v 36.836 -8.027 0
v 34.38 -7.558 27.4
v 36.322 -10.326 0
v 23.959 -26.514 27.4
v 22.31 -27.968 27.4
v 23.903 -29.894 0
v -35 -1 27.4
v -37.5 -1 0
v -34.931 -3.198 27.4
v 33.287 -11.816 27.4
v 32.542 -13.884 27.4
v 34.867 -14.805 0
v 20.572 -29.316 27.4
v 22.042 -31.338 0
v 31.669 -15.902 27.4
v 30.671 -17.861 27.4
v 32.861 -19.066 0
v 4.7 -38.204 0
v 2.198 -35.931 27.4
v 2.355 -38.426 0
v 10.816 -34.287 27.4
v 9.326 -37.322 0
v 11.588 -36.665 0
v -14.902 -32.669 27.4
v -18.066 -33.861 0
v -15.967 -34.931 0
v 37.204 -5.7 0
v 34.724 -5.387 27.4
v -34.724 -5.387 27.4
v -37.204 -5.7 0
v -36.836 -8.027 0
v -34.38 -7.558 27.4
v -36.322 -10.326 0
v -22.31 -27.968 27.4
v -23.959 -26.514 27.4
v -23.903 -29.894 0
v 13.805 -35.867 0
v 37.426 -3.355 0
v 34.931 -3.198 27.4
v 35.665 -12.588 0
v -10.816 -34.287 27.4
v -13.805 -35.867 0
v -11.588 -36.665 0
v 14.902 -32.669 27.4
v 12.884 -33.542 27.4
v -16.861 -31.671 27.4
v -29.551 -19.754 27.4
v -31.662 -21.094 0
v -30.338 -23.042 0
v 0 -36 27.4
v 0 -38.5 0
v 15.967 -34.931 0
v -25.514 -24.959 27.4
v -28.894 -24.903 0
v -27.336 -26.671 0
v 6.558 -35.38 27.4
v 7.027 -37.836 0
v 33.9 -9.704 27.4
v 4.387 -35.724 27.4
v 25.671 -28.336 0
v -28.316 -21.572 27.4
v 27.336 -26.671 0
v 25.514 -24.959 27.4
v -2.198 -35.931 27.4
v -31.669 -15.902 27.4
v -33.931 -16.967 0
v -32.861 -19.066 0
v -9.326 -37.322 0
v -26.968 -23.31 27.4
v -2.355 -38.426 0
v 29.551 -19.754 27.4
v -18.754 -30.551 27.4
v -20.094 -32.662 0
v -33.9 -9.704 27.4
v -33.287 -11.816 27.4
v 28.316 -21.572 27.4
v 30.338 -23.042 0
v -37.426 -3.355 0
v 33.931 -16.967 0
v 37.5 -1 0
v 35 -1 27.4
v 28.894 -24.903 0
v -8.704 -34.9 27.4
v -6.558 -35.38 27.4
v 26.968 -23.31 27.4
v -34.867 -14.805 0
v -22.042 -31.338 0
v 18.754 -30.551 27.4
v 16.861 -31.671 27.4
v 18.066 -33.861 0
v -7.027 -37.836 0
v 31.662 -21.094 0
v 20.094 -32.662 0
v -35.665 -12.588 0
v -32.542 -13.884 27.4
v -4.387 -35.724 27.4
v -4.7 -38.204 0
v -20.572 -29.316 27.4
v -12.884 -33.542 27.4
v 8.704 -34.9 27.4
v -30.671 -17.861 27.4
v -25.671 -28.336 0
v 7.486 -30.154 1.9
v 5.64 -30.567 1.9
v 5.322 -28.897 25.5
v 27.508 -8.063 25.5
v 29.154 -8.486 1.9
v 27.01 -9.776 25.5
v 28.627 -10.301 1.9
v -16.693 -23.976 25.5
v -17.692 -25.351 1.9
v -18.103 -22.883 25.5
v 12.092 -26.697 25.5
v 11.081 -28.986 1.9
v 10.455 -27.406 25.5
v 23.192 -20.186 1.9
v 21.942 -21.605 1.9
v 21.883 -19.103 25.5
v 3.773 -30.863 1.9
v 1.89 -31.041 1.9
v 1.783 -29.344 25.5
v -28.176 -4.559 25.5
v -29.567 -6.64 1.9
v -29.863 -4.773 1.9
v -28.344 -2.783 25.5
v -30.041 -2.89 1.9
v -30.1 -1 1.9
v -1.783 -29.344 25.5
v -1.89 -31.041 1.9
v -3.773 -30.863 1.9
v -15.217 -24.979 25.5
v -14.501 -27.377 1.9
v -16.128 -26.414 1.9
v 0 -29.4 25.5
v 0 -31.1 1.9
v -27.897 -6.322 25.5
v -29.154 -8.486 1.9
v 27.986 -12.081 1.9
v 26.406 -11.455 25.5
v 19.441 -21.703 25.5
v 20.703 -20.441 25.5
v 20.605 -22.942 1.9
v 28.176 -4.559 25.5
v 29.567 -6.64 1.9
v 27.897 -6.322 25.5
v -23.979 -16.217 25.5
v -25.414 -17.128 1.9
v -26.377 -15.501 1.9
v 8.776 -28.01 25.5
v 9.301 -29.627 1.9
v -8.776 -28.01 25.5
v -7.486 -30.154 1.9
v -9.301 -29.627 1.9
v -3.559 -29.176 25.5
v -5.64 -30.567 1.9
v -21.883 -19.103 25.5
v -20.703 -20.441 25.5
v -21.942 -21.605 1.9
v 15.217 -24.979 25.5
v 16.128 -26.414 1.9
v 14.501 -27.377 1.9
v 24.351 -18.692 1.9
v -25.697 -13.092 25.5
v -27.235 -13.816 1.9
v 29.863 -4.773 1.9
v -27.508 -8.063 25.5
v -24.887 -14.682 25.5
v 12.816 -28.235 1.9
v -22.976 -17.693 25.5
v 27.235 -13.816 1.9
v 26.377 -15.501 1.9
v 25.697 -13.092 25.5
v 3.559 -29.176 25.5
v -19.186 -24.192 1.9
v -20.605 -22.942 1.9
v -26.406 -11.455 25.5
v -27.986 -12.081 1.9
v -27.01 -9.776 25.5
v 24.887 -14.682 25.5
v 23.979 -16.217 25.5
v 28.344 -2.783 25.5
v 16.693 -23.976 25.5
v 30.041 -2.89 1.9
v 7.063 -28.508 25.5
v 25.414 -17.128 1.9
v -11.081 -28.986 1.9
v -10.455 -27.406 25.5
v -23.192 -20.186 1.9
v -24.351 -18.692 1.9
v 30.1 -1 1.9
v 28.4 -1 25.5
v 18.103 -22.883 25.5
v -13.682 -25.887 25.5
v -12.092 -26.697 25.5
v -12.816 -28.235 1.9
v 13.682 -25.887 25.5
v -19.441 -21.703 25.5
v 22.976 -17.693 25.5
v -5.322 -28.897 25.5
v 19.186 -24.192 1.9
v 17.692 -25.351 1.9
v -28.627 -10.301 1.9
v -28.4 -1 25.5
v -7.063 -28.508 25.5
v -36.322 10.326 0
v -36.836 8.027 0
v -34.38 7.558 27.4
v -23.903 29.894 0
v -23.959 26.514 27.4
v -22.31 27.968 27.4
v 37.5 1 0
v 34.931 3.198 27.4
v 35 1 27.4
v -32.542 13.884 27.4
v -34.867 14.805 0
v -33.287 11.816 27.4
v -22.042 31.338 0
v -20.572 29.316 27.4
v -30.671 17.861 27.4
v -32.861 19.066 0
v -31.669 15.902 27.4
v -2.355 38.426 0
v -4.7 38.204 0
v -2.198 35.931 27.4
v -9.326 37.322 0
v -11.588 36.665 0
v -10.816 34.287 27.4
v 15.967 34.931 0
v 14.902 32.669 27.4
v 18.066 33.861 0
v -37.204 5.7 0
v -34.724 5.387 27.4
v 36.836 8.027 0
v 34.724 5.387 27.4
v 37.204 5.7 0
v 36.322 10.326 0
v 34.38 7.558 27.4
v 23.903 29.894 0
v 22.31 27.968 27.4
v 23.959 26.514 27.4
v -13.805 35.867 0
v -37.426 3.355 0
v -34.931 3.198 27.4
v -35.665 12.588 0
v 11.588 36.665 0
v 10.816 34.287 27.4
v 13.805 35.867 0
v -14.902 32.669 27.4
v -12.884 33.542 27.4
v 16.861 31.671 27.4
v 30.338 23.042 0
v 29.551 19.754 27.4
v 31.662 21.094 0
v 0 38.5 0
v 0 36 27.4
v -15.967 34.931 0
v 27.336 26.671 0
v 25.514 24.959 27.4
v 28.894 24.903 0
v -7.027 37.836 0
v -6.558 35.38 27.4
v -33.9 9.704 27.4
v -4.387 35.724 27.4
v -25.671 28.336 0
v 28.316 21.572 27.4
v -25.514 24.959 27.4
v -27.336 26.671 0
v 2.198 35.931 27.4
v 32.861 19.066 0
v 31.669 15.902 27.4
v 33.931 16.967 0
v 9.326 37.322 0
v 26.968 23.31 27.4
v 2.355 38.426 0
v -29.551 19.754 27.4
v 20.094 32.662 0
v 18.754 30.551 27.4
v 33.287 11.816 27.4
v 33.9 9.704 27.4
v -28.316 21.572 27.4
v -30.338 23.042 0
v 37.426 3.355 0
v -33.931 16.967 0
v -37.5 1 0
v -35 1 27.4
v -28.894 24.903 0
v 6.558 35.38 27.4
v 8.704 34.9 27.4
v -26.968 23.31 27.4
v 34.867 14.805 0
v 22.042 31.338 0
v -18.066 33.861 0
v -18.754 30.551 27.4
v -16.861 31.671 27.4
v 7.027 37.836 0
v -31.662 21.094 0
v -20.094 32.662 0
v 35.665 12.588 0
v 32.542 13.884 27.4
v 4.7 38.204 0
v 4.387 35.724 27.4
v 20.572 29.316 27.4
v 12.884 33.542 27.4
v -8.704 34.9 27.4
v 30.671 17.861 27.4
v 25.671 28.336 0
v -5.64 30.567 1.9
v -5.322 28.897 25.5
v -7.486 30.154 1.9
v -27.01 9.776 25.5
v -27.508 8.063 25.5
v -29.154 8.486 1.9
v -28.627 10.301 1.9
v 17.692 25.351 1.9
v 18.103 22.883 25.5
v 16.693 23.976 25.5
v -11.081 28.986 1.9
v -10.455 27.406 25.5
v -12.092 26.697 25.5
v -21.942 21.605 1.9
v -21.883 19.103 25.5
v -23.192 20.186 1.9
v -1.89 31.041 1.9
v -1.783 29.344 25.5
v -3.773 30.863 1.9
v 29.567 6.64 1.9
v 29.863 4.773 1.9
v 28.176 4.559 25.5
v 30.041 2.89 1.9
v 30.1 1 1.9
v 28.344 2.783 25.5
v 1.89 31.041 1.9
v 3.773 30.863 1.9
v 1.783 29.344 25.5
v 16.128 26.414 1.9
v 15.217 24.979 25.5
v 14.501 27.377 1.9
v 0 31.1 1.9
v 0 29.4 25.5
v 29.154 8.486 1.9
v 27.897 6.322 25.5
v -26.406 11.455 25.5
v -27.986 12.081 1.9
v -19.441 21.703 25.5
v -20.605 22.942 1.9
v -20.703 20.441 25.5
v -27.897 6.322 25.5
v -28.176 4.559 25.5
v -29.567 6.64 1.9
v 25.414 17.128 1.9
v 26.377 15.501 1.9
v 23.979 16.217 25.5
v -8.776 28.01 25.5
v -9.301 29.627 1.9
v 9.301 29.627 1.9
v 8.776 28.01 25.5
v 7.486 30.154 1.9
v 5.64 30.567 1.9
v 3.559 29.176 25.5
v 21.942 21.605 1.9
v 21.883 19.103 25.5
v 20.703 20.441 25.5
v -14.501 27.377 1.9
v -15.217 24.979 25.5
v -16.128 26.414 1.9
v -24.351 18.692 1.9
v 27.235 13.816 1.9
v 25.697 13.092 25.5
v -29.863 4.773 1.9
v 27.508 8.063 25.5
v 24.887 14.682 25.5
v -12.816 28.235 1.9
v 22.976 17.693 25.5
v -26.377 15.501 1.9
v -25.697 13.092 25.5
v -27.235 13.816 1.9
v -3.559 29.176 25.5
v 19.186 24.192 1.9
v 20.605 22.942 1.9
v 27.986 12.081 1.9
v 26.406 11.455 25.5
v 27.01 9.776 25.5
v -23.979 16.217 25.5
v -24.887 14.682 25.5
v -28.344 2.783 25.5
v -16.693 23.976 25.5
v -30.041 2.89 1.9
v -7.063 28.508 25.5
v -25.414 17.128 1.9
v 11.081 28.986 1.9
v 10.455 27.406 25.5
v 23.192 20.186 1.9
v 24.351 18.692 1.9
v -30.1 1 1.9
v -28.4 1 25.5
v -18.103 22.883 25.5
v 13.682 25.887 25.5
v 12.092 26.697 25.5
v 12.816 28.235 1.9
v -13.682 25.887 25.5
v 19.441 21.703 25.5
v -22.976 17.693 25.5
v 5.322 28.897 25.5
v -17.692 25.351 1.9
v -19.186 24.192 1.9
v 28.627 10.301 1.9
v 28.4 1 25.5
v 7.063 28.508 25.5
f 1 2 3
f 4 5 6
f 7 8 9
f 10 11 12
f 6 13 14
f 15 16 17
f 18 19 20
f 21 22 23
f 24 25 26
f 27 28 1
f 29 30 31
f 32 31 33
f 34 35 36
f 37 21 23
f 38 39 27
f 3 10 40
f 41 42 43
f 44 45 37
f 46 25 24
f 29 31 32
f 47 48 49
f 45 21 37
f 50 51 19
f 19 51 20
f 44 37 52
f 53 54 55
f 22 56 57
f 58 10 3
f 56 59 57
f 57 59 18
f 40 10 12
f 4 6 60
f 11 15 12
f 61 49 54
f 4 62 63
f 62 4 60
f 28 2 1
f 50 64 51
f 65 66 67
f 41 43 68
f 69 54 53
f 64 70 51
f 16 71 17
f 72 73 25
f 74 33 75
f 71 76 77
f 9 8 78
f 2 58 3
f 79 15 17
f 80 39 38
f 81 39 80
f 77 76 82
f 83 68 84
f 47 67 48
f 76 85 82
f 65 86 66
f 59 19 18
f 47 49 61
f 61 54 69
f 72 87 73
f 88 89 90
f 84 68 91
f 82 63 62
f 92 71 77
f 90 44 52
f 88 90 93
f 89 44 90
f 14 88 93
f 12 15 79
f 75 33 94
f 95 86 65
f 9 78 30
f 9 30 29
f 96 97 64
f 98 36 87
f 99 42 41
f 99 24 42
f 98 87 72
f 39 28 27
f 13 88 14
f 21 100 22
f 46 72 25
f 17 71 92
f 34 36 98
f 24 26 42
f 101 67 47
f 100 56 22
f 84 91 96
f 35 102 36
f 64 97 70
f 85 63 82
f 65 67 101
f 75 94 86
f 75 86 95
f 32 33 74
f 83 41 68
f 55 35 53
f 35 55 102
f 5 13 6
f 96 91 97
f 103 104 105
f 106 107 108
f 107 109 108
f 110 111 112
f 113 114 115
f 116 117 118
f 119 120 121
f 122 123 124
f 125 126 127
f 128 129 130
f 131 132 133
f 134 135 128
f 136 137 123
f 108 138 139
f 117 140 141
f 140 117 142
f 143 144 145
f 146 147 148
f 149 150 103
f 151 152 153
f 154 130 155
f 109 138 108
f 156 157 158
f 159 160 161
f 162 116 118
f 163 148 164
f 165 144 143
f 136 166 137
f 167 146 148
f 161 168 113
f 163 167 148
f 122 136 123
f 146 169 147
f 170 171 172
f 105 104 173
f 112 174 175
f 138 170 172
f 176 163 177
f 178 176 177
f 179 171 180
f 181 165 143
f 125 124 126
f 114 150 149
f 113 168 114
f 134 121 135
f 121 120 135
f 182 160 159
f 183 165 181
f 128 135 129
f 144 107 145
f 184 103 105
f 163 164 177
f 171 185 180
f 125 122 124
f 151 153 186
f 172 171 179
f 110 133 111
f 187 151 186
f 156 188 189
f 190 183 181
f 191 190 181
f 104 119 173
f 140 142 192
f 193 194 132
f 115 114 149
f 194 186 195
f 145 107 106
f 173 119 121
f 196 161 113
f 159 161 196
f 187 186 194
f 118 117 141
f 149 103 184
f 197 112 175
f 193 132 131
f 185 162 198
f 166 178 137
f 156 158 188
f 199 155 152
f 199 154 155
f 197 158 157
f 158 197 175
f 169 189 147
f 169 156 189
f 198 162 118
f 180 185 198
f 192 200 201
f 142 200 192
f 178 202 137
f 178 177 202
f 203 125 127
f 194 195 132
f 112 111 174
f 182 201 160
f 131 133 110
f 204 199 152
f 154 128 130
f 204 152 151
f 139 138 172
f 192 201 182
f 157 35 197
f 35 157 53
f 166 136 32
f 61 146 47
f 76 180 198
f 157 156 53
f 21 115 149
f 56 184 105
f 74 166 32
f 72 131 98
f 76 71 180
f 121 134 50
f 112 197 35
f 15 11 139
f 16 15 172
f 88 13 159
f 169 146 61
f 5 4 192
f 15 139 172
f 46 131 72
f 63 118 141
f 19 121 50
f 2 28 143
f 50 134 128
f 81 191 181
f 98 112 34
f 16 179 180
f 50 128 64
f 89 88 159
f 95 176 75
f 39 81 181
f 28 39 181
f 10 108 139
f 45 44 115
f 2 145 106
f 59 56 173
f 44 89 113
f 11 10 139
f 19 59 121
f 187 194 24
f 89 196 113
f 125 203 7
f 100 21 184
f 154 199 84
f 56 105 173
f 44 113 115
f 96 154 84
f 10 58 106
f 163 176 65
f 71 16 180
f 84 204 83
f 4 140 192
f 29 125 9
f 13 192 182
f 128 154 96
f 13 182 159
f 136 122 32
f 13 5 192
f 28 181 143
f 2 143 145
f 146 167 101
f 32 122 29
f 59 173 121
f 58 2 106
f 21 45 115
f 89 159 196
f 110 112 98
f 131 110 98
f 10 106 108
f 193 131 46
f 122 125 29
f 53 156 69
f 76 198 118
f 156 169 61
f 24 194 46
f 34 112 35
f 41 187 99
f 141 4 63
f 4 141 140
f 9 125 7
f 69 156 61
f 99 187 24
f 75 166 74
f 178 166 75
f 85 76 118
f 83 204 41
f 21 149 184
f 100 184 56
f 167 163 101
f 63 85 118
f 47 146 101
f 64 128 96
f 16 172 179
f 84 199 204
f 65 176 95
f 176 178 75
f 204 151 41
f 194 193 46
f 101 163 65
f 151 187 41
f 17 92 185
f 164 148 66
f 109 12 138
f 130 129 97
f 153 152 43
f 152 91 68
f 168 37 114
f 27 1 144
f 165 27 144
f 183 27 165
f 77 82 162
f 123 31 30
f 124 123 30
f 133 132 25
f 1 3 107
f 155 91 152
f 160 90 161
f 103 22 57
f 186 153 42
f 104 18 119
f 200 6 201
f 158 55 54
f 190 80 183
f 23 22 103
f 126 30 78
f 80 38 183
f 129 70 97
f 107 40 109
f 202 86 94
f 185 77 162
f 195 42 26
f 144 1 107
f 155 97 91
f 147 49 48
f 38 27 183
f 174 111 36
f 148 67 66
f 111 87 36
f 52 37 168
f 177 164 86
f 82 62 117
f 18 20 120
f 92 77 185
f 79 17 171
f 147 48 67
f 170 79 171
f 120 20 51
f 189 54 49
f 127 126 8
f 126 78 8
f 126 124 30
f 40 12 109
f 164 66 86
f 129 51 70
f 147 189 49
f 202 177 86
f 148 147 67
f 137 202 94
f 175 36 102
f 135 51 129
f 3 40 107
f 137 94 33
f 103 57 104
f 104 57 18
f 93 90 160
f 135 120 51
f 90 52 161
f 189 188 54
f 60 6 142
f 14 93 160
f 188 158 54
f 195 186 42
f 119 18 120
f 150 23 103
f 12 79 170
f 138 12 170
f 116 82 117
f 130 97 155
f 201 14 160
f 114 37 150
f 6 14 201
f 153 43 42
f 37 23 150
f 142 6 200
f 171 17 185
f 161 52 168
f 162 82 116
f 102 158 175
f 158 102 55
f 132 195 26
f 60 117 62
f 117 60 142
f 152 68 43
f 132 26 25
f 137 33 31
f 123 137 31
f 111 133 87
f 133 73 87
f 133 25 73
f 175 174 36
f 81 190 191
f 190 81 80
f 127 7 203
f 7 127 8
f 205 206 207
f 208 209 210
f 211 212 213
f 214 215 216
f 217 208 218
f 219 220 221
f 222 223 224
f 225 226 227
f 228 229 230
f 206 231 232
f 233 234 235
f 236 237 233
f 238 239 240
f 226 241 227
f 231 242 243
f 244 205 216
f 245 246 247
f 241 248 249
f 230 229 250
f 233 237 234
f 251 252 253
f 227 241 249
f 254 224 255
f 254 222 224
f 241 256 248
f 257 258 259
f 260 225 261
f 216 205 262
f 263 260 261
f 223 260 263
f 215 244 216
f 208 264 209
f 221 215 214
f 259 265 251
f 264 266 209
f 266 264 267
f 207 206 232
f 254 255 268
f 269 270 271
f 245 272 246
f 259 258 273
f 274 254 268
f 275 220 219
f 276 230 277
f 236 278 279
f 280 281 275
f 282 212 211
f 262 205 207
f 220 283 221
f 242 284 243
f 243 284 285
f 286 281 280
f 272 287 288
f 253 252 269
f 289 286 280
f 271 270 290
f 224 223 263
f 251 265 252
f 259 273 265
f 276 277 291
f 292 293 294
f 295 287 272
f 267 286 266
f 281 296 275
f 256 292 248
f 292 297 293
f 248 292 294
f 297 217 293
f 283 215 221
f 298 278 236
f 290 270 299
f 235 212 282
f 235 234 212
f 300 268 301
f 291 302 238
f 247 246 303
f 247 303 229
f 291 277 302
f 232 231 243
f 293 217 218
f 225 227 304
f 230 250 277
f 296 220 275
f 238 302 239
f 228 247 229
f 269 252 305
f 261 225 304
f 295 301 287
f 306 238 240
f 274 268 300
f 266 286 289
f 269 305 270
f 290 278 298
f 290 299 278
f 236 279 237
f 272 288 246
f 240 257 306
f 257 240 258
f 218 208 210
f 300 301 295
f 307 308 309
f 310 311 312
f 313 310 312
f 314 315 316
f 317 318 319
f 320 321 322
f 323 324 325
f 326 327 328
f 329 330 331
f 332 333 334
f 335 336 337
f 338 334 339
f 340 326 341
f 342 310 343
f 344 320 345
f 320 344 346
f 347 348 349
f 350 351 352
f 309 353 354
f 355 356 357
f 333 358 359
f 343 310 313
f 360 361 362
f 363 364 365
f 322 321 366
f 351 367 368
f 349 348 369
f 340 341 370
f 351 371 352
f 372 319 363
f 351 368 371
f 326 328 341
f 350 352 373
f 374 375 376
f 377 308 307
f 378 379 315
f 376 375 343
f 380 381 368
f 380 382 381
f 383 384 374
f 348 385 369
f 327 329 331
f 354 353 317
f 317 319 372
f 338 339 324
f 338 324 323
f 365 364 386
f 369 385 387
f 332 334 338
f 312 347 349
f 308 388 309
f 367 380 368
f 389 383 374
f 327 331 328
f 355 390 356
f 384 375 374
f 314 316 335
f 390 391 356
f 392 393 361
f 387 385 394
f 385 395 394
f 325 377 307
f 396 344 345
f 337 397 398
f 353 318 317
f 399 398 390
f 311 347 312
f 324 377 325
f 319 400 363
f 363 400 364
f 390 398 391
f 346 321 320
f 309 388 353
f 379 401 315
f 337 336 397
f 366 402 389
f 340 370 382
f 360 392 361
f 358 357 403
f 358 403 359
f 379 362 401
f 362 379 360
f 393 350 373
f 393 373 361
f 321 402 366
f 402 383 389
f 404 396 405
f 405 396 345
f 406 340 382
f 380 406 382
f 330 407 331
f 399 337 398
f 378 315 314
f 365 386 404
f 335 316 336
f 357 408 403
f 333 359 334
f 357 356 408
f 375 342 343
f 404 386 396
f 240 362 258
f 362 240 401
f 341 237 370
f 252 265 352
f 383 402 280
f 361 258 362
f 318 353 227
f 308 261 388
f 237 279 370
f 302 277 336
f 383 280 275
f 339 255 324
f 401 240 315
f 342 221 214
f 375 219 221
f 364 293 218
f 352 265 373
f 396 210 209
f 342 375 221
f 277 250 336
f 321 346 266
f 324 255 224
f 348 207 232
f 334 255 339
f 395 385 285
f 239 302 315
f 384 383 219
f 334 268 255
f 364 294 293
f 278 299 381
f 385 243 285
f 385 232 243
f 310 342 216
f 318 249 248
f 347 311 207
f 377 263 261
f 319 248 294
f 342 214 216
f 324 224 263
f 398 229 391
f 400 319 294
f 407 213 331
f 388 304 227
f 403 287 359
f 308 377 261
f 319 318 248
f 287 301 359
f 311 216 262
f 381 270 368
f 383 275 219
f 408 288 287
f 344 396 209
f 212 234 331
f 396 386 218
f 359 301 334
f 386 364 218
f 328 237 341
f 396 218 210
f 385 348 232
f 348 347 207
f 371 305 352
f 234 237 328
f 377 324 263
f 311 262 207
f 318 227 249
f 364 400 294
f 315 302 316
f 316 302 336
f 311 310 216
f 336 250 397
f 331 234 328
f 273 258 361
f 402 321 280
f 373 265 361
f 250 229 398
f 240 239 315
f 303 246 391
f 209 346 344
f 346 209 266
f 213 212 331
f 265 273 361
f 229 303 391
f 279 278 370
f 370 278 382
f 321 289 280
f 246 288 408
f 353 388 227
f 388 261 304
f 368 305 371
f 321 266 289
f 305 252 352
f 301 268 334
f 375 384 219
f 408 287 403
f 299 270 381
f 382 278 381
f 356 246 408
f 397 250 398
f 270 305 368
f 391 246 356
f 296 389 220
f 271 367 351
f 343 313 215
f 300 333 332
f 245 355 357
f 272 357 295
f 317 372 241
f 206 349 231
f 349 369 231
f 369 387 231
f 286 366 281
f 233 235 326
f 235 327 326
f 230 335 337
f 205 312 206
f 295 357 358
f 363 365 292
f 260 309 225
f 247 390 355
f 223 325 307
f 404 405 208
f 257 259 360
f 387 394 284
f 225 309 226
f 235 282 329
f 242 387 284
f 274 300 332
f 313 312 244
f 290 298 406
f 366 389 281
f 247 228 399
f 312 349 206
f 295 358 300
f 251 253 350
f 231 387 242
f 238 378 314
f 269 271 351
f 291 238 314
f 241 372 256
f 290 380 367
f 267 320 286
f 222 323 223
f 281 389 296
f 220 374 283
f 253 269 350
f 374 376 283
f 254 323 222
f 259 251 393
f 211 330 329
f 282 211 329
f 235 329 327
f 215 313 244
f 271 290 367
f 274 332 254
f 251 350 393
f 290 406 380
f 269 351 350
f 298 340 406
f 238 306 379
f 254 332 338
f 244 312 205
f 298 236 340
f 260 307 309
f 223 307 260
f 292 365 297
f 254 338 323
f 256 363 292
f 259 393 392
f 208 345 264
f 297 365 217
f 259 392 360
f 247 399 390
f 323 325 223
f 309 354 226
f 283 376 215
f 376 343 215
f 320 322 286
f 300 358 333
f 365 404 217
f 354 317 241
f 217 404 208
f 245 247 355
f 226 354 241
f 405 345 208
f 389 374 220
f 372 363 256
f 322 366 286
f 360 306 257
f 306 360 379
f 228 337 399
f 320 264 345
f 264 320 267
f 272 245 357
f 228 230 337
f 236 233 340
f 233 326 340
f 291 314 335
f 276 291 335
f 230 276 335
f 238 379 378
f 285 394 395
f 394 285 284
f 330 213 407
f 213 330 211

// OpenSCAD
d_in_max = 60.2;
d_in_min = 56.8;
h_in = 23.6;

d_out_max = 75;
d_out_min = 70;
h_out = 27.4;

$fn=100;

module spool(){
difference(){
cylinder(r1=d_out_max/2, r2=d_out_min/2, h=h_out);
translate([0,0,(h_out-h_in)/2])cylinder(r1=d_in_max/2, r2=d_in_min/2, h=h_in);
translate([0,0,h_in+(h_out-h_in)/2])cylinder(r1=d_in_min/2, r2=d_out_min/2, h=(h_out-h_in)/2);
translate([0,0,0])cylinder(r1=d_out_max/2, r2=d_in_max/2, h=(h_out-h_in)/2);
translate([-d_out_max,0,-1])cube([d_out_max*2,d_out_max,h_out*2]);
}
}

translate([0,-1,0])spool();
translate([0,1,0])rotate([0,0,180])spool();
